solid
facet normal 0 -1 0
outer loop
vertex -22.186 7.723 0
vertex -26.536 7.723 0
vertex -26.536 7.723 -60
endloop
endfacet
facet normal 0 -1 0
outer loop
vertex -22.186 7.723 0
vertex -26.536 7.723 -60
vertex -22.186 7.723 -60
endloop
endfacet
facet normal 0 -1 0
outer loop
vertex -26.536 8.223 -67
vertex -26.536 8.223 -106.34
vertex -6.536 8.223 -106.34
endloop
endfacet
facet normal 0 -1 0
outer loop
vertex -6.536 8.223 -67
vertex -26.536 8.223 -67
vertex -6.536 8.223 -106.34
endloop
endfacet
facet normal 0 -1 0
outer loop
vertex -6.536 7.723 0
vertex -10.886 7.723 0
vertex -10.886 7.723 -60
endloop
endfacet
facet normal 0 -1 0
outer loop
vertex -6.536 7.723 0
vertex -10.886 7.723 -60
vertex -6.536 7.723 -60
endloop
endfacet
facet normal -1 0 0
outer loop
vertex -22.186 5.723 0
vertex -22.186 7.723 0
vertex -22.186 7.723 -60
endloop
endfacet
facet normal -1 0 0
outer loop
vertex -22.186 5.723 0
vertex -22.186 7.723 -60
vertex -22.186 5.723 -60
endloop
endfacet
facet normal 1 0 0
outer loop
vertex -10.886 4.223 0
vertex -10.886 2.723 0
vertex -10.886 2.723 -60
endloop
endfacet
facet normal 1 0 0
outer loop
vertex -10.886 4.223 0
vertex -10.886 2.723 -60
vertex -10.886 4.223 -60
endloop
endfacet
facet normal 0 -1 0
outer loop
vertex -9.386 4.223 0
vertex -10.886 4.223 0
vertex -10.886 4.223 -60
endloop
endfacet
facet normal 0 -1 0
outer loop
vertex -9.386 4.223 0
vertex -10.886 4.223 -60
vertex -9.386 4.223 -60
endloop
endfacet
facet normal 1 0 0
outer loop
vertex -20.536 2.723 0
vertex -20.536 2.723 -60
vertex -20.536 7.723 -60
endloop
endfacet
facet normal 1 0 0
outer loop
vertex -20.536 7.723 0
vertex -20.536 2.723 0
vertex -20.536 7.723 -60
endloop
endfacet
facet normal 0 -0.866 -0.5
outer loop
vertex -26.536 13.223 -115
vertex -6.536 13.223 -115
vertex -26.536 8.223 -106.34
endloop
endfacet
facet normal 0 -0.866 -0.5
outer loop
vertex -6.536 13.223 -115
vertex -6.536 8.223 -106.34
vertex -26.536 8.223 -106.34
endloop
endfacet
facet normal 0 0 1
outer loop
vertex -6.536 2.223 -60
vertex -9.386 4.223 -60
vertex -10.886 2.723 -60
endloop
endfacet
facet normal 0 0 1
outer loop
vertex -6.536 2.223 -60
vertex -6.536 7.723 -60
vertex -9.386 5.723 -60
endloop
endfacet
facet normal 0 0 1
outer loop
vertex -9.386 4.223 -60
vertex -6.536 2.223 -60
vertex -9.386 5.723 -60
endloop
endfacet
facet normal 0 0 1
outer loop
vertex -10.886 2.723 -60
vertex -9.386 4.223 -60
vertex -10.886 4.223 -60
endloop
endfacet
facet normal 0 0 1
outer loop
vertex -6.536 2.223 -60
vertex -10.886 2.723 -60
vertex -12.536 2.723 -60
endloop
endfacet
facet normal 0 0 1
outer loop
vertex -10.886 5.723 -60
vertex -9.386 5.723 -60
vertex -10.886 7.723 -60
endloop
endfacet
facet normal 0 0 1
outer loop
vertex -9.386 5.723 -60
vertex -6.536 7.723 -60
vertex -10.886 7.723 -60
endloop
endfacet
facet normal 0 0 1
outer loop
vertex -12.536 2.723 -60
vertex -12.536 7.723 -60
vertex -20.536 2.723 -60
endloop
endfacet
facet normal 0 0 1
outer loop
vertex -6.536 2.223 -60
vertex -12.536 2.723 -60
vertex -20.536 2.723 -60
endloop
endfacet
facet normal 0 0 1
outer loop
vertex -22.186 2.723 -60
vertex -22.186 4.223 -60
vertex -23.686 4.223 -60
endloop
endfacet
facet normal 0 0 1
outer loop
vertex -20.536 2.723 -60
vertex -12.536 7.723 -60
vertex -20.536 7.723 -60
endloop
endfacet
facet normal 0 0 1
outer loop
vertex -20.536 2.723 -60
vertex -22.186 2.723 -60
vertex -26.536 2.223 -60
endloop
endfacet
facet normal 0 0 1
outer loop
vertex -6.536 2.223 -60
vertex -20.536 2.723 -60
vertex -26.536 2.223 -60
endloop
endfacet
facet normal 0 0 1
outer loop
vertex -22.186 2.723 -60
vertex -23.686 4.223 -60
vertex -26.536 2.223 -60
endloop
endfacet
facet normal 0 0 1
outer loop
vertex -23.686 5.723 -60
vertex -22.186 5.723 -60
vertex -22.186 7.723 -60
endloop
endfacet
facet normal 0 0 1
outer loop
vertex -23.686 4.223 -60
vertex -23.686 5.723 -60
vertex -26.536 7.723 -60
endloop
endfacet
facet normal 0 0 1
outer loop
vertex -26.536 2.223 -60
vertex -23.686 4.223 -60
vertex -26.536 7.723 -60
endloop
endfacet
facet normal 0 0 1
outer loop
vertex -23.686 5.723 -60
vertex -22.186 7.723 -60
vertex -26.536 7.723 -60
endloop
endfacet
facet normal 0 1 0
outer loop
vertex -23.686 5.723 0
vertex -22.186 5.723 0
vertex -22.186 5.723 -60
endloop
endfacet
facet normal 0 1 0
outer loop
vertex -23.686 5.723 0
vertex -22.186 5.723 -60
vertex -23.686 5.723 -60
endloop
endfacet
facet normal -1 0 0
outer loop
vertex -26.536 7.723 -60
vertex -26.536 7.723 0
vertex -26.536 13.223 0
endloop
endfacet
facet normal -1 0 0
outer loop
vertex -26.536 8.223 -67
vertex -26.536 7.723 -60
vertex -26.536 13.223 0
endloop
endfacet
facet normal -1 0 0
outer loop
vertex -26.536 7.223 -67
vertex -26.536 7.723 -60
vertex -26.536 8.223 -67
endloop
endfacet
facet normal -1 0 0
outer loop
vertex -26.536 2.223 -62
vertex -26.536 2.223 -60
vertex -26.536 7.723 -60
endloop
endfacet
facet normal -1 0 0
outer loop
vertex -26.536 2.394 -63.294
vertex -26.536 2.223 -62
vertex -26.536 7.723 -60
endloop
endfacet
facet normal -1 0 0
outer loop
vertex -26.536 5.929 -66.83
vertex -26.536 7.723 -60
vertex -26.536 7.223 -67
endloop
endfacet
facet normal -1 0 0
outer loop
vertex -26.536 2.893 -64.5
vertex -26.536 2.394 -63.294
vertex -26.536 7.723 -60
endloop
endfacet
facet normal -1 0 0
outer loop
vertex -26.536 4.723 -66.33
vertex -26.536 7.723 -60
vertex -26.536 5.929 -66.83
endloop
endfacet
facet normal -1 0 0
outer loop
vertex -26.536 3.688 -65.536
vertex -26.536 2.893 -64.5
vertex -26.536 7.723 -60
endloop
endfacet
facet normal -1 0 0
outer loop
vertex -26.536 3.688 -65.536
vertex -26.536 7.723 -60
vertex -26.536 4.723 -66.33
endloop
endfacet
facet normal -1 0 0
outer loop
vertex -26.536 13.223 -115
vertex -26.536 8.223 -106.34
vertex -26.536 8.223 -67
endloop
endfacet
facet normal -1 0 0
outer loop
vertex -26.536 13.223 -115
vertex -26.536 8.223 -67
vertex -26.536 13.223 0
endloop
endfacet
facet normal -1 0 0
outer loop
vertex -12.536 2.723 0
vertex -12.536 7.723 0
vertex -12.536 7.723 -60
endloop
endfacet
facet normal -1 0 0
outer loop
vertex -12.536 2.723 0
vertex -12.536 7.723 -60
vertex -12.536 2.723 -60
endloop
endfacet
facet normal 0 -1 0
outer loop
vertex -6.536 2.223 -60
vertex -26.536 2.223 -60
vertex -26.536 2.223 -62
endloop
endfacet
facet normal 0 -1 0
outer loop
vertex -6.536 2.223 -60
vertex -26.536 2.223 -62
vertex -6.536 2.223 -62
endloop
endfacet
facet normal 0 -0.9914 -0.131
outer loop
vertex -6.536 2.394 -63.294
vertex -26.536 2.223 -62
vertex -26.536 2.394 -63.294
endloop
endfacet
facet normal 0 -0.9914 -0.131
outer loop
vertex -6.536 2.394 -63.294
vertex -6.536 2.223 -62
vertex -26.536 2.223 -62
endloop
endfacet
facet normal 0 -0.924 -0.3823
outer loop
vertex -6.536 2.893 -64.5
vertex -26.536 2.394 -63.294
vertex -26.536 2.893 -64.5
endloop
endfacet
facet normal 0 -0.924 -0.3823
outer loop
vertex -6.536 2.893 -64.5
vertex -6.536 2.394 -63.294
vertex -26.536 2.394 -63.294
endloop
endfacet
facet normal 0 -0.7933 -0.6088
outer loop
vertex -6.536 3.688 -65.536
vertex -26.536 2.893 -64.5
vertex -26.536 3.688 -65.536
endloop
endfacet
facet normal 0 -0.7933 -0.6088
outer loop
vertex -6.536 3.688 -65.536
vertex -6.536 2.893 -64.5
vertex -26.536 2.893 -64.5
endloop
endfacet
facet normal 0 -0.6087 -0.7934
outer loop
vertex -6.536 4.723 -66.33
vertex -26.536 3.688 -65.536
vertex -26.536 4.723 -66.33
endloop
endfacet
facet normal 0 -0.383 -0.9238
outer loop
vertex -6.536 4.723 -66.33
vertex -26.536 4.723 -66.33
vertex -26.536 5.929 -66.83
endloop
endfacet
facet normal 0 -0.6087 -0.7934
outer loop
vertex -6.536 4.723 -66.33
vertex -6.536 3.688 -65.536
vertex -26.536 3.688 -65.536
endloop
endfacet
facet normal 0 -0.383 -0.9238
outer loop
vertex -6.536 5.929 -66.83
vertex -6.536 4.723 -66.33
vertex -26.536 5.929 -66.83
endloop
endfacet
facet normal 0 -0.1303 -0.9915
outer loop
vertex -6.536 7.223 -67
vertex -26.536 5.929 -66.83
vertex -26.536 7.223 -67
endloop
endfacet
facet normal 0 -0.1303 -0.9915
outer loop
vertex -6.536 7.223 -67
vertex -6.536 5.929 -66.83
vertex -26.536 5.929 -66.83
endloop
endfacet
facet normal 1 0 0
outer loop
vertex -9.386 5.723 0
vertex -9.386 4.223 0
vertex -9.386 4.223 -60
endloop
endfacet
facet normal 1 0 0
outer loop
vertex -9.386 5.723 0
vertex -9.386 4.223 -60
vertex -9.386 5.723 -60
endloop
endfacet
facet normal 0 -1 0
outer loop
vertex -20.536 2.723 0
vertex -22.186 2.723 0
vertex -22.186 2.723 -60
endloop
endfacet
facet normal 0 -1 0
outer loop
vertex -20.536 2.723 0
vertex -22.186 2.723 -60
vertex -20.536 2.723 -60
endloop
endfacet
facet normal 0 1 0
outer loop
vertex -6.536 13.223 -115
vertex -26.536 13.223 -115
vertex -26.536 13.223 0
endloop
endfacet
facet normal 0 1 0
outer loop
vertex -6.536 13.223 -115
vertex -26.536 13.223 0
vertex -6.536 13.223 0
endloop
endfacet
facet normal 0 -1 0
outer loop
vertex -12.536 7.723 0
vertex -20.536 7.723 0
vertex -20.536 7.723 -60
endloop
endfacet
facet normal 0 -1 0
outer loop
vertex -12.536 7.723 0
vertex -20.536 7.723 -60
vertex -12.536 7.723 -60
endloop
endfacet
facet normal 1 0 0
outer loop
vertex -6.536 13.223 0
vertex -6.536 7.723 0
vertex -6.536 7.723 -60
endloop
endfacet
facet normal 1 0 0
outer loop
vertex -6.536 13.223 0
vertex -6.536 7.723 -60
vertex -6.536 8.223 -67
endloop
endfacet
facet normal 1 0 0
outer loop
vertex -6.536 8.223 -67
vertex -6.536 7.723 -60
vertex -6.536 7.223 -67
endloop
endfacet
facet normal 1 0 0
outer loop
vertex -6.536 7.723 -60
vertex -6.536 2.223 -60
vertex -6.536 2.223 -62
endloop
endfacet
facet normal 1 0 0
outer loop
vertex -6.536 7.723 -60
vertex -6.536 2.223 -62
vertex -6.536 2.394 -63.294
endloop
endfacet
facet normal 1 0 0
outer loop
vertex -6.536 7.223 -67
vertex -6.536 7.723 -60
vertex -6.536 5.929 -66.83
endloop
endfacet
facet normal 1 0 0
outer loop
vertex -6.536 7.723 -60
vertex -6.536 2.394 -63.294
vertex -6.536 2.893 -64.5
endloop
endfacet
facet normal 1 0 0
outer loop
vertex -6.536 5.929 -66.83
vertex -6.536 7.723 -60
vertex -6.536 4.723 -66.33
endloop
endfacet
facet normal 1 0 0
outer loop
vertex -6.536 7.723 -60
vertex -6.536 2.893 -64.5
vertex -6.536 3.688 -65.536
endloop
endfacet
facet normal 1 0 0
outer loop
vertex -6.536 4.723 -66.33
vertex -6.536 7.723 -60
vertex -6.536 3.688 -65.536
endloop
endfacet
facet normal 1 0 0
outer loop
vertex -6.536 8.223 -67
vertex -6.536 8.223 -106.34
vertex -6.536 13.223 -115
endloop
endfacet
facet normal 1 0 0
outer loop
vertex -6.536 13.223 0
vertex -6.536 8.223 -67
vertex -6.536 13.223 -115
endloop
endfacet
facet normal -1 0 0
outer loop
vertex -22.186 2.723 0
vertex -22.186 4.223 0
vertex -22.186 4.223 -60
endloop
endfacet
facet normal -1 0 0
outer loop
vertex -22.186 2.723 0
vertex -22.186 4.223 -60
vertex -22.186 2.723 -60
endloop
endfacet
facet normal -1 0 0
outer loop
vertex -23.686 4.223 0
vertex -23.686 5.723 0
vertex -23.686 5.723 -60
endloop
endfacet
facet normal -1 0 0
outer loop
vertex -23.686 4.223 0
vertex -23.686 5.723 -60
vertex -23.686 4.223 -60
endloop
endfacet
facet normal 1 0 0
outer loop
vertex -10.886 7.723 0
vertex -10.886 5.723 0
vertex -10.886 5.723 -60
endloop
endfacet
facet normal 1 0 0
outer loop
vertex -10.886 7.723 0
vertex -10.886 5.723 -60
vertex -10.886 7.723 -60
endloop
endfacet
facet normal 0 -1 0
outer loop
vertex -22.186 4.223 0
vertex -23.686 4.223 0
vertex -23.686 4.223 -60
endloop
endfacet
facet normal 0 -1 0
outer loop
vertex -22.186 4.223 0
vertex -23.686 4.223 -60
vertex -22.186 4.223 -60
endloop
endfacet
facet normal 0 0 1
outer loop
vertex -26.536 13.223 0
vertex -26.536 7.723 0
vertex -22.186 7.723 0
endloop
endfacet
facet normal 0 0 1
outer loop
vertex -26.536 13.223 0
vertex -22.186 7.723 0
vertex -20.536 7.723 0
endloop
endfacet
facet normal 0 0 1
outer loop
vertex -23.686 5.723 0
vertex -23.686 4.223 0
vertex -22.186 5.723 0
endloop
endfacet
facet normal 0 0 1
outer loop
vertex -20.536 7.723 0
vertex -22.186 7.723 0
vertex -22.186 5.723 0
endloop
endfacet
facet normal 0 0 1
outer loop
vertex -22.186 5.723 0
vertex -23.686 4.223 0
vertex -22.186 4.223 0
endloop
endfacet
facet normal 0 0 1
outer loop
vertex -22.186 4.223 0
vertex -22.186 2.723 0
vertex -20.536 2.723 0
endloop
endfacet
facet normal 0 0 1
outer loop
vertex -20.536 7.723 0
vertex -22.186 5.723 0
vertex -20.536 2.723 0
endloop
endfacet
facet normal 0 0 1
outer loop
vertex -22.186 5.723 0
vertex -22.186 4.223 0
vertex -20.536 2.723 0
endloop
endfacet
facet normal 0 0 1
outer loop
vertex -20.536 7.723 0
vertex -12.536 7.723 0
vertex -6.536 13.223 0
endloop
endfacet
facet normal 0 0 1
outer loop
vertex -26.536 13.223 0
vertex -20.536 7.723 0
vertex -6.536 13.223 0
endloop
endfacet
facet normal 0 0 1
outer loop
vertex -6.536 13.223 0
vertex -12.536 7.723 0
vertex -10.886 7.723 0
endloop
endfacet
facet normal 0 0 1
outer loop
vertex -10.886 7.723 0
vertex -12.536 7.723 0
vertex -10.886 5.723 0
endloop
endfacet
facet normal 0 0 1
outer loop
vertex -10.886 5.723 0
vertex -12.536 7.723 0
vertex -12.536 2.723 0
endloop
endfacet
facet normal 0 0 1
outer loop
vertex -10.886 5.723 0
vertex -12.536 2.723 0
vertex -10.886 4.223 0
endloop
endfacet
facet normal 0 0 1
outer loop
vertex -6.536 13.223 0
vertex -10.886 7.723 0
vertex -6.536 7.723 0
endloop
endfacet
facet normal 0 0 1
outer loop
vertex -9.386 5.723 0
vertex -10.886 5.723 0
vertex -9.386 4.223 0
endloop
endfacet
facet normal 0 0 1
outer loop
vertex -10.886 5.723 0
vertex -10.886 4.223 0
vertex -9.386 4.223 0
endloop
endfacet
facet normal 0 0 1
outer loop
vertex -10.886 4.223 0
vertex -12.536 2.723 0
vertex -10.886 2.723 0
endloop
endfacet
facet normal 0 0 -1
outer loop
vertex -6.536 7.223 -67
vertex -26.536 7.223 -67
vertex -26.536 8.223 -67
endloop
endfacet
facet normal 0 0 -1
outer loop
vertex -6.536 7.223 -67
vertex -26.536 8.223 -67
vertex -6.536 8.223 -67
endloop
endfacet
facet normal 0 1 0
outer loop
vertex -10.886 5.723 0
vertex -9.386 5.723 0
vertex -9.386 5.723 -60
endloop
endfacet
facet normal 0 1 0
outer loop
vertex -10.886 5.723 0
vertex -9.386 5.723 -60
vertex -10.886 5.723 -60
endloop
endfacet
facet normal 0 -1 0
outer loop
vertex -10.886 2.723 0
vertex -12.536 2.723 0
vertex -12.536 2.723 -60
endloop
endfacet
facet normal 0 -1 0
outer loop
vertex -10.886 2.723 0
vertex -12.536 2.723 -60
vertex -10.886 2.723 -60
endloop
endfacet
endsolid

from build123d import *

# Parameters (mm, degrees)
SKETCH1_W           = 20
SKETCH1_H           = 8
BOSS_EXTRUDE1_DEPTH = 115
CUT_EXTRUDE1_DEPTH  = 60
SKETCH3_W           = 20
SKETCH3_H           = 115
BOSS_EXTRUDE2_DEPTH = 3
SKETCH13_W          = 46.736094472
SKETCH13_H          = 63.842099498
CUT_EXTRUDE5_DEPTH  = 30
SKETCH15_W          = 20
SKETCH15_H          = 40
CUT_EXTRUDE6_DEPTH  = 6
FILLET1_R           = 5


with BuildPart() as part:
    # Sketch1 → Boss-Extrude1 (new body)
    with BuildSketch(Plane.XY):
        with Locations((-16.536312849, 6.223463687)):
            Rectangle(SKETCH1_W, SKETCH1_H)
    extrude(amount=-BOSS_EXTRUDE1_DEPTH)

    # Sketch2 → Cut-Extrude1 (cut)
    with BuildSketch(Plane.XY):
        Polygon((-26.536312849, 7.723463687), (-22.186312849, 7.723463687), (-22.186312849, 5.723463687), (-23.686312849, 5.723463687), (-23.686312849, 4.223463687), (-22.186312849, 4.223463687), (-22.186312849, 2.723463687), (-20.536312849, 2.723463687), (-20.536312849, 7.723463687), (-12.536312849, 7.723463687), (-12.536312849, 2.723463687), (-10.886312849, 2.723463687), (-10.886312849, 4.223463687), (-9.386312849, 4.223463687), (-9.386312849, 5.723463687), (-10.886312849, 5.723463687), (-10.886312849, 7.723463687), (-6.536312849, 7.723463687), (-6.536312849, 2.223463687), (-26.536312849, 2.223463687), align=None)
    extrude(amount=-CUT_EXTRUDE1_DEPTH, mode=Mode.SUBTRACT)

    # Sketch3 → Boss-Extrude2 (add)
    with BuildSketch(Plane(origin=(0, 10.223463687, 0), x_dir=(1, 0, 0), z_dir=(0, 1, 0))):
        with Locations((-16.536312849, 57.5)):
            Rectangle(SKETCH3_W, SKETCH3_H)
    extrude(amount=BOSS_EXTRUDE2_DEPTH)

    # Sketch13 → Cut-Extrude5 (cut)
    with BuildSketch(Plane(origin=(0, -39.878862952, -23.02407226), x_dir=(-1, 0, 0), z_dir=(0, 0.866025403784438, 0.500000000000001))):
        with Locations((16.217588554, -100.321082734)):
            Rectangle(SKETCH13_W, SKETCH13_H)
    extrude(amount=-CUT_EXTRUDE5_DEPTH, mode=Mode.SUBTRACT)

    # Sketch15 → Cut-Extrude6 (cut)
    with BuildSketch(Plane.XZ.offset(-2.223463687)):
        with Locations((-16.536312849, -87)):
            Rectangle(SKETCH15_W, SKETCH15_H)
    extrude(amount=-CUT_EXTRUDE6_DEPTH, mode=Mode.SUBTRACT)

    # Fillet1
    fillet1_edges = [part.edges().sort_by_distance(p)[0] for p in [
        (-16.536312849, 2.223463687, -67),
    ]]
    fillet(fillet1_edges, radius=FILLET1_R)


solid = part.part
